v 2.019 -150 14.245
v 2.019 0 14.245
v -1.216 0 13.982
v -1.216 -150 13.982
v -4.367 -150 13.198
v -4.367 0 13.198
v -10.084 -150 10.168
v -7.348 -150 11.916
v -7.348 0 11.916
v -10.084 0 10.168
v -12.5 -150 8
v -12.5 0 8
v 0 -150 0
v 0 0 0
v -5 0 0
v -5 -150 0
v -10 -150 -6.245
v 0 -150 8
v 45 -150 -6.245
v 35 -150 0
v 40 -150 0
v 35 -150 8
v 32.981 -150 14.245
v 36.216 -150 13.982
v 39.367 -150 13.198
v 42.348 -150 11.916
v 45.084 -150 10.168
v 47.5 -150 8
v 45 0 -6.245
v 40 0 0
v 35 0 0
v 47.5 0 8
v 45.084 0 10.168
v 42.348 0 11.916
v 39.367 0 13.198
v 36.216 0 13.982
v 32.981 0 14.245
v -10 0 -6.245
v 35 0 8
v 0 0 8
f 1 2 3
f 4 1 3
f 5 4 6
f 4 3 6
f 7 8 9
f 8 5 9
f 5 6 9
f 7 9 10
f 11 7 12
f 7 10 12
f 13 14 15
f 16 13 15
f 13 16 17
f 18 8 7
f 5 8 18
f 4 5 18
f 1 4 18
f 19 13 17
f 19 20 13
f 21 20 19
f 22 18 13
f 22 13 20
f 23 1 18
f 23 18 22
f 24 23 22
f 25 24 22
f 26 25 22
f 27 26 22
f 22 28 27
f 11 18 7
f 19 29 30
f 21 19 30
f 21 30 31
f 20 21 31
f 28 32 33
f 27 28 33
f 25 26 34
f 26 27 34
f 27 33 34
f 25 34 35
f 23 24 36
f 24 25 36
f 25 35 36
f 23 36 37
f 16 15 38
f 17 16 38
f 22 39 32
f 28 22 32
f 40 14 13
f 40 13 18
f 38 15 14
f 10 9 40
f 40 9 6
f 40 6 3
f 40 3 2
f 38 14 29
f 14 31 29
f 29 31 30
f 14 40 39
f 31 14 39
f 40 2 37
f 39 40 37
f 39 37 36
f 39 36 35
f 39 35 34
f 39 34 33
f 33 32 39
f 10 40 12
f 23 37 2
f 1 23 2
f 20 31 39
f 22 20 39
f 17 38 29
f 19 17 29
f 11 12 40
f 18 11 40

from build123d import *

# Parameters (mm, degrees)
F0_W        = 35
F0_H        = 8
F1_DEPTH    = 150
F2_T1_DEPTH = 197.5947518654


# Not quite as in the source:
# - a fillet or chamfer that OpenCascade refuses, or shapes differently, is made with other operations: its cross-section is extruded or revolved along the edge and cut away or added


with BuildPart() as f1:
    # F0 (on Front) → F1 (new body)
    with BuildSketch(Plane.XZ):
        with Locations((17.5, 4)):
            Rectangle(F0_W, F0_H)
        Polygon((35, 0), (0, 0), (-5, 0), (-10, -6.2449979984), (45, -6.2449979984), (40, 0), align=None)
        Polygon((-12.5, 8), (0, 8), (35, 8), (47.5, 8), (42.5, 14.2449979984), (-7.5, 14.2449979984), align=None)
    extrude(amount=F1_DEPTH)

    # F2: fillet of radius 20 on 2 edges, made by hand

    # F2_s2 → F2_t1 (cut)
    with BuildSketch(Plane.XZ.offset(-23.7973759327)):
        with BuildLine():
            ThreePointArc((2.0189503731, 14.2449979984), (-5.8835796005, 12.6175323912), (-12.5, 8))
            Line((-12.5, 8), (-7.5, 14.2449979984))
            Line((-7.5, 14.2449979984), (2.0189503731, 14.2449979984))
        make_face()
        with BuildLine():
            ThreePointArc((47.5, 8), (40.8835796005, 12.6175323912), (32.9810496269, 14.2449979984))
            Line((32.9810496269, 14.2449979984), (42.5, 14.2449979984))
            Line((42.5, 14.2449979984), (47.5, 8))
        make_face()
    extrude(amount=F2_T1_DEPTH, mode=Mode.SUBTRACT)


solid = f1.part
